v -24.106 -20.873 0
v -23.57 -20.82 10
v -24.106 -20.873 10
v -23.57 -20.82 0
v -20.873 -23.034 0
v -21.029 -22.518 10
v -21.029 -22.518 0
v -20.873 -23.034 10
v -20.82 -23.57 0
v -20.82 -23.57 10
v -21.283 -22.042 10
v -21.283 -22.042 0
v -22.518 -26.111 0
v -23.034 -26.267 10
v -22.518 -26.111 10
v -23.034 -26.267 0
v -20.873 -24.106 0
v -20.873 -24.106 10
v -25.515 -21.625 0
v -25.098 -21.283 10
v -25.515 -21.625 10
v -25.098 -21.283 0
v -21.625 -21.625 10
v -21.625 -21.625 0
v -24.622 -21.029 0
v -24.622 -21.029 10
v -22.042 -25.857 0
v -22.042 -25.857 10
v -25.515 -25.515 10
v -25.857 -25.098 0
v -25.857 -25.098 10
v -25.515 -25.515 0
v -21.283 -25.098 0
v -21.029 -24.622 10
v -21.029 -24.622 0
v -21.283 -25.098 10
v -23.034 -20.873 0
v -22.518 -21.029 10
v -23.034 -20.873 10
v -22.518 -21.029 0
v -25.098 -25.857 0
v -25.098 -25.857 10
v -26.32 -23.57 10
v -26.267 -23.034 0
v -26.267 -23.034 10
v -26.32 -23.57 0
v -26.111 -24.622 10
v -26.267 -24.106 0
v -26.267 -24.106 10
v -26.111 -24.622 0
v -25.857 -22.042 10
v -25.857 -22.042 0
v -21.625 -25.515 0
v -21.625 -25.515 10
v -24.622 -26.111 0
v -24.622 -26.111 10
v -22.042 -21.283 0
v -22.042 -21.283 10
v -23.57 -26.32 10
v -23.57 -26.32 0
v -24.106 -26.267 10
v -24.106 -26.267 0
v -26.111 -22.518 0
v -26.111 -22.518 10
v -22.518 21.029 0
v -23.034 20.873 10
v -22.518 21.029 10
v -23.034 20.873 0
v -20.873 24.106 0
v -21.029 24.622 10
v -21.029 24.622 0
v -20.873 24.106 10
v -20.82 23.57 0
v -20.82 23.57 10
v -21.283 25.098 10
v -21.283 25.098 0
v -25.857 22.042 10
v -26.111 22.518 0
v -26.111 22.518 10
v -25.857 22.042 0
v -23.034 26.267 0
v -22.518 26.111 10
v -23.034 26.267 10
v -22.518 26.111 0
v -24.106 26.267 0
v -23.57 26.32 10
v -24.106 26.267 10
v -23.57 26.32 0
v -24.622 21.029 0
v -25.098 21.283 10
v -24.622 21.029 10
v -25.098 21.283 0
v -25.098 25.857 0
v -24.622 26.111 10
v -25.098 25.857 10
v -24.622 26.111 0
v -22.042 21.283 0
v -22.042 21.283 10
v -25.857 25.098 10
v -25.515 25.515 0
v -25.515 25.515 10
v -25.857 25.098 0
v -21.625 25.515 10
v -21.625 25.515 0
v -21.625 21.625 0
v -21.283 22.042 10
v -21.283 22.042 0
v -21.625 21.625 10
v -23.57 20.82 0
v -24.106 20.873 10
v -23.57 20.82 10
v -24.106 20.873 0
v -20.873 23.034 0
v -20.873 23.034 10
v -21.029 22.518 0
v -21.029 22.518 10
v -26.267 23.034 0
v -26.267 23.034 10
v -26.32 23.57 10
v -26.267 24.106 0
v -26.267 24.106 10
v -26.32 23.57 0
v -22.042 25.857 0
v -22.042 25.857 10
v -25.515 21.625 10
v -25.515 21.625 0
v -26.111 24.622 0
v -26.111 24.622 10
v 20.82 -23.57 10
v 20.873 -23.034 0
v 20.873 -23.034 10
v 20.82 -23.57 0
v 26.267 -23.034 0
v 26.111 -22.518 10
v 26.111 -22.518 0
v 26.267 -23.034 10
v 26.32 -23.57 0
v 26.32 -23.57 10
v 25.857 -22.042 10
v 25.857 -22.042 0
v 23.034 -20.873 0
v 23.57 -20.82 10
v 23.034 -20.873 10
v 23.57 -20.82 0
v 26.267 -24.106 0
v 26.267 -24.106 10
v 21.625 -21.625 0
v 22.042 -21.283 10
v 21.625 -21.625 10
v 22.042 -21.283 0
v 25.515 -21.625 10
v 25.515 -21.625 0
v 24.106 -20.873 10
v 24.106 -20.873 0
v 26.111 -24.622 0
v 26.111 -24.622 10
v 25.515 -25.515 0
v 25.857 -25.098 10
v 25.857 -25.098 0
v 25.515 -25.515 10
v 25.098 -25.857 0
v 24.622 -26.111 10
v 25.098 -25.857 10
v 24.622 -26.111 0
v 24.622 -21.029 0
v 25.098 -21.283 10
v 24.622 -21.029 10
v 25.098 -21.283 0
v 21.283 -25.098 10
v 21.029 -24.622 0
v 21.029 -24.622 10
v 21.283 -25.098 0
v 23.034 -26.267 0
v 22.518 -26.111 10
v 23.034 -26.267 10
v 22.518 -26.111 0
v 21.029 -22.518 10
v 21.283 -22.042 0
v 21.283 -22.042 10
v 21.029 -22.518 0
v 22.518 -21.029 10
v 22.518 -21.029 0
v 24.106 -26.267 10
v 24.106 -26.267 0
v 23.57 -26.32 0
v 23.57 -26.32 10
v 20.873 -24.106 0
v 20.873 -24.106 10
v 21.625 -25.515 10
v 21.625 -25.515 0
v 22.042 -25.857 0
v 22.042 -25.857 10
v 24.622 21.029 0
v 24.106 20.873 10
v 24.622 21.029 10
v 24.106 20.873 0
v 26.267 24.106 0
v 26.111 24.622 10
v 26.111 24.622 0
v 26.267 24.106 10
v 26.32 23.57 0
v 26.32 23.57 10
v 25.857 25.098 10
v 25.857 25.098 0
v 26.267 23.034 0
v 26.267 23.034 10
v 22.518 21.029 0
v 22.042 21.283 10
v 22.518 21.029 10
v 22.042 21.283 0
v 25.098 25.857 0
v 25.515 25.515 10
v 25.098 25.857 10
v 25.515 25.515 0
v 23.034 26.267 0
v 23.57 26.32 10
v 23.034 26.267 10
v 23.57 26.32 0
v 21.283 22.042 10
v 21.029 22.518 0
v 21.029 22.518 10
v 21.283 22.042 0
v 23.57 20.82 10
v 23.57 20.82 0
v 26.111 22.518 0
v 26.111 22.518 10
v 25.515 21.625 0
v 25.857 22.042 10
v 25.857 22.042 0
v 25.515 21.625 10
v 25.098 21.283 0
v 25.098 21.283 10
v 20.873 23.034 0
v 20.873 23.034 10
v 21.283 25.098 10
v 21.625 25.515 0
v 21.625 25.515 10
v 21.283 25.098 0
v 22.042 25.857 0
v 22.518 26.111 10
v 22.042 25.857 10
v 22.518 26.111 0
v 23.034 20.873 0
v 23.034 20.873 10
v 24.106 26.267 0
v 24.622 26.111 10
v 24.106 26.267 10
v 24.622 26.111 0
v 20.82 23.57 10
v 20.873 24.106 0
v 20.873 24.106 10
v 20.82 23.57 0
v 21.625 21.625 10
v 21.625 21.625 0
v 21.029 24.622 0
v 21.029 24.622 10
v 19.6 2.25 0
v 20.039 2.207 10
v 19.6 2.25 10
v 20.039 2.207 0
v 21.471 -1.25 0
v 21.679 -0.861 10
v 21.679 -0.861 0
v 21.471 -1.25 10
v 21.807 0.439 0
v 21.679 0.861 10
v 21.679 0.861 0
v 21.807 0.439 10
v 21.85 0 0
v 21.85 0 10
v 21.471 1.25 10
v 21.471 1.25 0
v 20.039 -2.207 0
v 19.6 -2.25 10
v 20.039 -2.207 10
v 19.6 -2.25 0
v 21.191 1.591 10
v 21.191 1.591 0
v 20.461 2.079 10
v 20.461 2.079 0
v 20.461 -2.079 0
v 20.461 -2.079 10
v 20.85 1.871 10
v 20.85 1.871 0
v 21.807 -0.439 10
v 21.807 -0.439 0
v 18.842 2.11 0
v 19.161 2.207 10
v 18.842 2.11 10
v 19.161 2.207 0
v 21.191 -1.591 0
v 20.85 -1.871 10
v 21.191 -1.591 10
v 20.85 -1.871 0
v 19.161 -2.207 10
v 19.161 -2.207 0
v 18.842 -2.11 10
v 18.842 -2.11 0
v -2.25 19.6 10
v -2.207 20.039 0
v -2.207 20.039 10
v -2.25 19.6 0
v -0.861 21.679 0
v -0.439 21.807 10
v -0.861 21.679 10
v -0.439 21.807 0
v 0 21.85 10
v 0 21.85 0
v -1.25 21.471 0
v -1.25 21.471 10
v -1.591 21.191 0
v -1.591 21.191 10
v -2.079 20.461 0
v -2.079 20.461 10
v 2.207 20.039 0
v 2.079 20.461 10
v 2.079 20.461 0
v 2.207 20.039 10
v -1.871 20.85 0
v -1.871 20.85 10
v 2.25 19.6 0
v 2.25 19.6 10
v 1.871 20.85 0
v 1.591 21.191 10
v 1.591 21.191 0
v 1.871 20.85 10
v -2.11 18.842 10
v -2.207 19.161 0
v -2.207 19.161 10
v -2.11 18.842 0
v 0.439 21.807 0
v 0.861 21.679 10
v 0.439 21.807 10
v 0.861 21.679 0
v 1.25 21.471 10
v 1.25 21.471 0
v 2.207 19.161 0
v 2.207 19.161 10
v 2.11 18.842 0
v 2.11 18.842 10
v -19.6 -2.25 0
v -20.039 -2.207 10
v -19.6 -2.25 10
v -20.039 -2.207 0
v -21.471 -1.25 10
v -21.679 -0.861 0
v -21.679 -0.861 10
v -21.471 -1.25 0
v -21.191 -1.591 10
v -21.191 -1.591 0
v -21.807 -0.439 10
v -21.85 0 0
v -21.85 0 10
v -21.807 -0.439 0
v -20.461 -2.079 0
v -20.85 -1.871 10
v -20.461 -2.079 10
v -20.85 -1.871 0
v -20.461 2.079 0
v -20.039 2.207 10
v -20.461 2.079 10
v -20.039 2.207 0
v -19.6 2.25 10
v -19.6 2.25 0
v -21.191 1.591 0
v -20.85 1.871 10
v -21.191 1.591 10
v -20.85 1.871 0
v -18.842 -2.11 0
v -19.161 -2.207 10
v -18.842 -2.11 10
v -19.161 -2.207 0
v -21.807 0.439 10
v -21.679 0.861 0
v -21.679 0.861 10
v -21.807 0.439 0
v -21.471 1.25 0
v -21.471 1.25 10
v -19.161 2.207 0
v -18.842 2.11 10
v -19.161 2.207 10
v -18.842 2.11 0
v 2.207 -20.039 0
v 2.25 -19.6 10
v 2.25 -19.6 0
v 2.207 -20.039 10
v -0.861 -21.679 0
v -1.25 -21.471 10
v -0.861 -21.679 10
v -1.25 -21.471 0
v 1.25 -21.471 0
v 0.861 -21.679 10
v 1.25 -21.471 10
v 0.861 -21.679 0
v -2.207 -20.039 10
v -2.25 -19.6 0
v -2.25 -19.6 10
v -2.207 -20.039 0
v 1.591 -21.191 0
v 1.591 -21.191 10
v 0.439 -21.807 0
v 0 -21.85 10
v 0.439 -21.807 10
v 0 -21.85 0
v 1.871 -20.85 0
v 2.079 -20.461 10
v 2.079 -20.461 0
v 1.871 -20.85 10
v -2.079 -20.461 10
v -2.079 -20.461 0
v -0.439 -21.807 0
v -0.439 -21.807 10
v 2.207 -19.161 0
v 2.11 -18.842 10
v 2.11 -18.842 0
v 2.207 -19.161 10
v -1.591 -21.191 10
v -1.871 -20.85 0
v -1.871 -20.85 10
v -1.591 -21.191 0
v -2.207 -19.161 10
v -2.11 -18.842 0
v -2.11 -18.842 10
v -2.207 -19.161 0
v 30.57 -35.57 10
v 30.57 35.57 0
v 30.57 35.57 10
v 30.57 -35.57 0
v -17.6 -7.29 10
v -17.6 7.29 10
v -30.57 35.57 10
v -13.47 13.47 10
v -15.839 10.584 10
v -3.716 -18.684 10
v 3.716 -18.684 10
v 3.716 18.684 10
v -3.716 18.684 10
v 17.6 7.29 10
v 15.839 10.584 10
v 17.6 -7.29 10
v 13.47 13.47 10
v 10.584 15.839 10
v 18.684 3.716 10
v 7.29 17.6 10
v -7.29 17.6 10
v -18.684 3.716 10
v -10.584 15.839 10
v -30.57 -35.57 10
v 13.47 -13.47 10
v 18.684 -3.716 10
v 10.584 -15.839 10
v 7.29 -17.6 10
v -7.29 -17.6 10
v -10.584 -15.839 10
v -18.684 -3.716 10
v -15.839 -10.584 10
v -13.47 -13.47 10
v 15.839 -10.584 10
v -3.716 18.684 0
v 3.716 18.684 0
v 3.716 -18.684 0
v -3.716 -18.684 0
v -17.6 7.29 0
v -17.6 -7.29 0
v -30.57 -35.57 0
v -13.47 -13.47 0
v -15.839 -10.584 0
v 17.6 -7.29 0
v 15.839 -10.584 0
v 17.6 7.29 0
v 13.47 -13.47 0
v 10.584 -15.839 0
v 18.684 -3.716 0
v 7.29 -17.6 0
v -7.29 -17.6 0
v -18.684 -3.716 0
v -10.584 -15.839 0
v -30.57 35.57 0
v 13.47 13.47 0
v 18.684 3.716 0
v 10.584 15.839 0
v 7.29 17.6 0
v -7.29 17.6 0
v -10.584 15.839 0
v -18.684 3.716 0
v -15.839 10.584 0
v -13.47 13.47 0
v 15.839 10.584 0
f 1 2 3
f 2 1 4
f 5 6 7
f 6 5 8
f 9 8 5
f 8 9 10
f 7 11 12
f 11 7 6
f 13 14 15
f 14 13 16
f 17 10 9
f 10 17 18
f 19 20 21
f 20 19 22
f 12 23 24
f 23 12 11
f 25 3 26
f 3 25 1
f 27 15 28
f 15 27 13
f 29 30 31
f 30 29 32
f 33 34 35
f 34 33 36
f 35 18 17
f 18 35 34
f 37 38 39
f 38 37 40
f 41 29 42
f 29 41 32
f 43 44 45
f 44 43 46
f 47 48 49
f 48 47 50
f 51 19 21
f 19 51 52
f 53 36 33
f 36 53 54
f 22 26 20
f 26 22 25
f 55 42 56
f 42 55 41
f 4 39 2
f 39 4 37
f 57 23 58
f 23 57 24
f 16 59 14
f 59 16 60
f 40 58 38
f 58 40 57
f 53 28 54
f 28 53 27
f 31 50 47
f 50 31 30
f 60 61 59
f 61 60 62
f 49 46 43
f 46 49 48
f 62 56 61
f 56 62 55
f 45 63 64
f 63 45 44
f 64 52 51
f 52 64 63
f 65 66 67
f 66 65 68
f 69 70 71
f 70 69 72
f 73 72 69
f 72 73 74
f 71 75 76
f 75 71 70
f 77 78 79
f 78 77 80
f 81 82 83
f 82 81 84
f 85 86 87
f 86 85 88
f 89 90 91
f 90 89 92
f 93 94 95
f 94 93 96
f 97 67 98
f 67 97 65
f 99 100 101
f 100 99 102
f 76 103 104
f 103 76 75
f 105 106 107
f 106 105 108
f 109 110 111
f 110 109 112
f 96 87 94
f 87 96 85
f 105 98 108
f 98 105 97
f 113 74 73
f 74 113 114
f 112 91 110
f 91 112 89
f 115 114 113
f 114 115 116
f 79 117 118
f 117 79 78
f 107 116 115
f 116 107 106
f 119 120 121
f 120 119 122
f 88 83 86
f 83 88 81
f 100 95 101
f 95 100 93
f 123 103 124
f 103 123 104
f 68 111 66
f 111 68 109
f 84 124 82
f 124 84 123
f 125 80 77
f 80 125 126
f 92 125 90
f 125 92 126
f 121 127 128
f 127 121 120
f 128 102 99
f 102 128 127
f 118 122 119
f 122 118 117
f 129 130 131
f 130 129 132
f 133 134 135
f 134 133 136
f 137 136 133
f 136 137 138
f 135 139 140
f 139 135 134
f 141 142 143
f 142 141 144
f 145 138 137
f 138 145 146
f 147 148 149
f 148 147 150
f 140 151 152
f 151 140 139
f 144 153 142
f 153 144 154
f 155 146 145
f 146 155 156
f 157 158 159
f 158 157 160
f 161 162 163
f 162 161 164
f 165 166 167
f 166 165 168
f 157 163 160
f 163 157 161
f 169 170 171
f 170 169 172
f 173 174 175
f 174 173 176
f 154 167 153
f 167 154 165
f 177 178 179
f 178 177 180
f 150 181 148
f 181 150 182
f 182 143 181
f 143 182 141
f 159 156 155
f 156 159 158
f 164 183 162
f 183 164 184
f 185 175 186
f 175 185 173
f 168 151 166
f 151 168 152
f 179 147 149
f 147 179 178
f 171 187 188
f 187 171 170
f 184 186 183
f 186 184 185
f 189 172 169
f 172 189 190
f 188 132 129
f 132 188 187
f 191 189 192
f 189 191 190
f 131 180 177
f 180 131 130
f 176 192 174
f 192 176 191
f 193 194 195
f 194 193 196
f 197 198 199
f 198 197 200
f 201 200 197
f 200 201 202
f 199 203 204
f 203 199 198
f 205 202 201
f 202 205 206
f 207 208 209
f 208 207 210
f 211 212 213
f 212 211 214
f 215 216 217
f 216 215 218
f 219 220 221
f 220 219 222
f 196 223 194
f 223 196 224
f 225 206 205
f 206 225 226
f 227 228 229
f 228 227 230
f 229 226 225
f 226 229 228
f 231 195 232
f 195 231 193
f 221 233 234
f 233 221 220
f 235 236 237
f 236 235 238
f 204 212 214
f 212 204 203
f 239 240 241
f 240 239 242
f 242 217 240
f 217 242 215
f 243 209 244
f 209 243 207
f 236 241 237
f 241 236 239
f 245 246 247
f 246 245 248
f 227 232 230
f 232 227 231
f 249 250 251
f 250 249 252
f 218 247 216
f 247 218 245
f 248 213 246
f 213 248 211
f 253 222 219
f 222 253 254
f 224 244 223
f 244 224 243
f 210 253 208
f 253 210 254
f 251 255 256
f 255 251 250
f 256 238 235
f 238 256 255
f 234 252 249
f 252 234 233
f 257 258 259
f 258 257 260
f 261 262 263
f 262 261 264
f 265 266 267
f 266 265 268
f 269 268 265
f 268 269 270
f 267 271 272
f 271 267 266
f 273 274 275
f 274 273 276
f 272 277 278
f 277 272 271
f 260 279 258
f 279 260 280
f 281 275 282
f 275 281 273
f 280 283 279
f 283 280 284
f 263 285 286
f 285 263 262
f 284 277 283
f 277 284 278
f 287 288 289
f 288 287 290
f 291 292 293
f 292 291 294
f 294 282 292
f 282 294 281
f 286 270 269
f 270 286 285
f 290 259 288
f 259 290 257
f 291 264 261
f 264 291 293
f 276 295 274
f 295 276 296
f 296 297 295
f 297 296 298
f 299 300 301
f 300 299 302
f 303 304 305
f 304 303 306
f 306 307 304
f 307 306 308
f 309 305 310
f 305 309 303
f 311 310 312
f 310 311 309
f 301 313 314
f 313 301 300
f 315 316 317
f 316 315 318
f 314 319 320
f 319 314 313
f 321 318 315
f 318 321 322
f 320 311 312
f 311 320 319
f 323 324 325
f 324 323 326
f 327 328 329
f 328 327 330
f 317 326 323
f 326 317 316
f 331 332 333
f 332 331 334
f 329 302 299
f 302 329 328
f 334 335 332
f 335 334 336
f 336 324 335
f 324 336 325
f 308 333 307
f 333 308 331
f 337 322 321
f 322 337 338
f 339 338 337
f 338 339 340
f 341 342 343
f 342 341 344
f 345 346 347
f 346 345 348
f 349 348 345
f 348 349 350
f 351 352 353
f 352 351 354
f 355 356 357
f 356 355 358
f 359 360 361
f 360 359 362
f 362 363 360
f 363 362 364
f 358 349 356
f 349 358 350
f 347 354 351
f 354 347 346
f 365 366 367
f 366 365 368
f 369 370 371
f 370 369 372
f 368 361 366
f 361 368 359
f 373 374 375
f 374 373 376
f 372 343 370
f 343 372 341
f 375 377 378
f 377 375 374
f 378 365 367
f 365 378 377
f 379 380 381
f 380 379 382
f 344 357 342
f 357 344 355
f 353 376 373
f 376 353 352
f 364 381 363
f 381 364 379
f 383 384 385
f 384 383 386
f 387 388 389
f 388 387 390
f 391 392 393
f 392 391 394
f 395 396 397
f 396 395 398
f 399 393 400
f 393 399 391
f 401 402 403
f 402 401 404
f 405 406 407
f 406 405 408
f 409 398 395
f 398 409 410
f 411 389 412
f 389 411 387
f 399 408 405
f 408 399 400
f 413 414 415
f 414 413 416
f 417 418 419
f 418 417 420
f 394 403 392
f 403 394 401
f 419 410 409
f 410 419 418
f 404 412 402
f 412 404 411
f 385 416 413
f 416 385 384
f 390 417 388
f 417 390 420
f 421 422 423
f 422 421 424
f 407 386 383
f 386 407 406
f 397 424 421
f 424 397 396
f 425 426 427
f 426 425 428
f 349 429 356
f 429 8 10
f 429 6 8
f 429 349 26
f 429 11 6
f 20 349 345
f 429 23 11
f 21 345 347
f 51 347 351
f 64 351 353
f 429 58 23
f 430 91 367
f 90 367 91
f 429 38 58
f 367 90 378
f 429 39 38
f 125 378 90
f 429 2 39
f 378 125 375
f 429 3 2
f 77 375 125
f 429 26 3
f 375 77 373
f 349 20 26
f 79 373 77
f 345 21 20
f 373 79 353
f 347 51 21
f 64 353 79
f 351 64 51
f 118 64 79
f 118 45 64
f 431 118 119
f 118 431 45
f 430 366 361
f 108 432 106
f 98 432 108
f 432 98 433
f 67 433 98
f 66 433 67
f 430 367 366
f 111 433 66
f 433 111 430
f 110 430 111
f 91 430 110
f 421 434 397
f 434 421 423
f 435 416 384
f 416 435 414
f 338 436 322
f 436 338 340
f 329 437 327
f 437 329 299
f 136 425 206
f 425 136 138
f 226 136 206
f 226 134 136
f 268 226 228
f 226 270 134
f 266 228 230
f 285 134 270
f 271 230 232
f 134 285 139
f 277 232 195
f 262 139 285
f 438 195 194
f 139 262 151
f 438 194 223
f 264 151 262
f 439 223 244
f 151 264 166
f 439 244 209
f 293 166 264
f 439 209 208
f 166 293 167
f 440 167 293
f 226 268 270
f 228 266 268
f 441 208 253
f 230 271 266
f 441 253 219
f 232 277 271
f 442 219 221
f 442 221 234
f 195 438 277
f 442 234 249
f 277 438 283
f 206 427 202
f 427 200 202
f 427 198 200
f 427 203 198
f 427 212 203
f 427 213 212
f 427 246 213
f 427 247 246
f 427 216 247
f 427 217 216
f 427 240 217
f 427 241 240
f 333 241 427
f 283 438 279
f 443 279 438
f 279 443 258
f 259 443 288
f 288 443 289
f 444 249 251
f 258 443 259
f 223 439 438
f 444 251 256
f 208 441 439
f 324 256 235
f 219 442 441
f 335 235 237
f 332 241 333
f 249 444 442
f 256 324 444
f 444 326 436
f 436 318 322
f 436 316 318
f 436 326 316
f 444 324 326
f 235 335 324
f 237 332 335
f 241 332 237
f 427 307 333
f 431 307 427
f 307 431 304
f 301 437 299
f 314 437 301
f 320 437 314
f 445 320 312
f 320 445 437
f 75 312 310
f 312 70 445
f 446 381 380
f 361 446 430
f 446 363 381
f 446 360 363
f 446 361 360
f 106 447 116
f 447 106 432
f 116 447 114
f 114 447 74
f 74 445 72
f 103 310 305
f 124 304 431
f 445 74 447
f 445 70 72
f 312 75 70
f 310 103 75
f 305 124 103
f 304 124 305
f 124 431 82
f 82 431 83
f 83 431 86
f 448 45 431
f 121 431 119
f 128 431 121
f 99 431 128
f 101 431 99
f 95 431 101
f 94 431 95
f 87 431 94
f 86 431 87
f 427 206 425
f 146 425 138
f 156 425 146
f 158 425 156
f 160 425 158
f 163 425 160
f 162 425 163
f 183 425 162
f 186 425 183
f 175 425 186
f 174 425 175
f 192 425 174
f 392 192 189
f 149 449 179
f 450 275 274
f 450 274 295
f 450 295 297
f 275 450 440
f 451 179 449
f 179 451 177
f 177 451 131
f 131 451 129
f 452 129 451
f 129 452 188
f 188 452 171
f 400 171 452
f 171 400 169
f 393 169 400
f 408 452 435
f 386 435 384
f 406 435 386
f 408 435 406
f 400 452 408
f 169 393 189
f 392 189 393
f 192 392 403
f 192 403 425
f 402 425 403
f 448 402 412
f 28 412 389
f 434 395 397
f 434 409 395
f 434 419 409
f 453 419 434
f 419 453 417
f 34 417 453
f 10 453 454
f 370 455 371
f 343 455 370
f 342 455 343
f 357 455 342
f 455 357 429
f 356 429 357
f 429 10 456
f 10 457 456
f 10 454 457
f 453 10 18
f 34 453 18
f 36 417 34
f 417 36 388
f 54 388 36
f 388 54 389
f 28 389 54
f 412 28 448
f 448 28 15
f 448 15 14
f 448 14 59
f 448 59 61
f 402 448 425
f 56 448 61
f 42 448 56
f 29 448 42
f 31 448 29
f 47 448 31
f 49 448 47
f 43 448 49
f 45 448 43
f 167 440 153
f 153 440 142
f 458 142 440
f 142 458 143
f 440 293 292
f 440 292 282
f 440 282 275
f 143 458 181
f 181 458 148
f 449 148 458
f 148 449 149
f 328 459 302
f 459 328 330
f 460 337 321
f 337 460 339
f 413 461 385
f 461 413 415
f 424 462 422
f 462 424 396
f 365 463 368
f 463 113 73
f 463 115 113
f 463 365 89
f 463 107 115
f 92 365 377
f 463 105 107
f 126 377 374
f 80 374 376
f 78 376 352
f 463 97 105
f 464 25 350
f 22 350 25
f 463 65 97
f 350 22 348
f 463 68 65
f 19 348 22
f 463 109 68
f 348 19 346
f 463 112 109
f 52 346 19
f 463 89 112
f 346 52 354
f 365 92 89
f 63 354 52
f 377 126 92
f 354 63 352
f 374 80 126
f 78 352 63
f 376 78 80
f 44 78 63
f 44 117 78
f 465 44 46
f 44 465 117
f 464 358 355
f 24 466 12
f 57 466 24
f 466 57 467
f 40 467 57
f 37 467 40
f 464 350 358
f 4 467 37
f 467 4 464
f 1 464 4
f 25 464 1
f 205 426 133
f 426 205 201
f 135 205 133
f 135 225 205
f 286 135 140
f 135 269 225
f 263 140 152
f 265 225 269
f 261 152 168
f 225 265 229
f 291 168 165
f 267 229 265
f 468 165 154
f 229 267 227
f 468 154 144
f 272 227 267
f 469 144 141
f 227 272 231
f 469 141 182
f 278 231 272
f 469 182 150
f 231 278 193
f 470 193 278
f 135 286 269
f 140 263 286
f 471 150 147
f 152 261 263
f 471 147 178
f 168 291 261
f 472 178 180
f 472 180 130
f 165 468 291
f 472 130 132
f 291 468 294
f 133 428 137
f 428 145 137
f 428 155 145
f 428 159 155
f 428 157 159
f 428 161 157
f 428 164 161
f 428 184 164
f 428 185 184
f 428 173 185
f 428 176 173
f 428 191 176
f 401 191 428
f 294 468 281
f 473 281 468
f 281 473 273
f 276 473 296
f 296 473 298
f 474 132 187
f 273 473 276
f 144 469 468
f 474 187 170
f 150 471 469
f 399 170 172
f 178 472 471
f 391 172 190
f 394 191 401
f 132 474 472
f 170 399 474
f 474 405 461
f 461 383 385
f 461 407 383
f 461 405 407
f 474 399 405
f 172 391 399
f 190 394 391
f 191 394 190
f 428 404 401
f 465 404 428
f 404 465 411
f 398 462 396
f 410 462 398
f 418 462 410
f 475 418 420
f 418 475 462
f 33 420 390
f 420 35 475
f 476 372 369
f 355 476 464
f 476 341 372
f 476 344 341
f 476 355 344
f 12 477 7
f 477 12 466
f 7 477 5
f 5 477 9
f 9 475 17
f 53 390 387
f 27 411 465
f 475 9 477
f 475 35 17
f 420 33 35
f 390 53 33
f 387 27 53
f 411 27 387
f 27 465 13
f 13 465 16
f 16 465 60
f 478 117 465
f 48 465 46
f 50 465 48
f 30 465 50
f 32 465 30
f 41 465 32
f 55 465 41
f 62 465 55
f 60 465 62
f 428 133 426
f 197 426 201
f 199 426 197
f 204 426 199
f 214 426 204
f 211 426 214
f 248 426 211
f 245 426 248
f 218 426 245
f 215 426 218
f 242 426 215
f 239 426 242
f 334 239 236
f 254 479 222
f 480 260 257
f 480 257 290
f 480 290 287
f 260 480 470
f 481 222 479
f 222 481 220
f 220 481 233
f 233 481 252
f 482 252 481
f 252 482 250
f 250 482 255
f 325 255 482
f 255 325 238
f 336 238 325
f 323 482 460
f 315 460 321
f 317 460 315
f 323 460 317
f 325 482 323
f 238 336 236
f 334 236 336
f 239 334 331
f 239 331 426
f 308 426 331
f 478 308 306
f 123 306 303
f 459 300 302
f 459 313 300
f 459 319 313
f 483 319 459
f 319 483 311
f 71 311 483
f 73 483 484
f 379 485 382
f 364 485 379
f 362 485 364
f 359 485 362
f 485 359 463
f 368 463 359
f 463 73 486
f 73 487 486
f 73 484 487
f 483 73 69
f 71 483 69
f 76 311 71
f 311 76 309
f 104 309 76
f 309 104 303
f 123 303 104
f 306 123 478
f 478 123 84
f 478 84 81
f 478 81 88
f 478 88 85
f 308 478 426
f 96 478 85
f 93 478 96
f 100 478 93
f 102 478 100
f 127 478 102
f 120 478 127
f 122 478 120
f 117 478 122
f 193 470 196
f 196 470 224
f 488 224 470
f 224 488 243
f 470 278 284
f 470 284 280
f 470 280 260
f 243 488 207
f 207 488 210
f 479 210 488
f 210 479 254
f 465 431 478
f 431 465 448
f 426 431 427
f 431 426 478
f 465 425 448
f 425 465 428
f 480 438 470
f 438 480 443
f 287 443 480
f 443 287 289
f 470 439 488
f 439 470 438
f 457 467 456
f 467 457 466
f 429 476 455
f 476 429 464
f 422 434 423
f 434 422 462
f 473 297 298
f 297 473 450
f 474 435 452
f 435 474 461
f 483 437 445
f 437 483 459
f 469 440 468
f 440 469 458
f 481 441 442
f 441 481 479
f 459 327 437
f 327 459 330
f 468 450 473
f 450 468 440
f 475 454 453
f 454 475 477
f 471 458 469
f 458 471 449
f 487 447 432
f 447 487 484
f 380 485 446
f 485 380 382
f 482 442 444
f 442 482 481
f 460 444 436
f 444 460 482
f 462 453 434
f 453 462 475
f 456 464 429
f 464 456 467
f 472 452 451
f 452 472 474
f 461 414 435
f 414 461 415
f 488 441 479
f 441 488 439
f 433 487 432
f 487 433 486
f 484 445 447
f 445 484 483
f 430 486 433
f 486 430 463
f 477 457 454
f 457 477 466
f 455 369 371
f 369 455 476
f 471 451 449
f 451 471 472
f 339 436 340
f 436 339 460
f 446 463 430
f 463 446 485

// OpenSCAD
$fn = 32;

// ----------------------------------------------------------------------
// Motor mount plate: NEMA23, 61.14 x 71.14 x 10 mm
// ----------------------------------------------------------------------

// --- parameters (mm) ---
base_x = 61.14;           // plate length, X
base_y = 71.14;           // plate width, Y
thick = 10;               // plate thickness
bolt_pitch = 47.14;       // NEMA23 bolt spacing
motor_d = 5.5;            // NEMA23 screw clearance
boss_hole = 38.1;         // pilot boss bore
second_d = 4.5;           // second fastener hole
bc_r = 19.6;              // second bolt circle radius
bc_n = 4;                 // second bolt circle count

module plate() {
  translate([-base_x / 2, -base_y / 2, 0]) cube([base_x, base_y, thick]);
}

module motor_holes() {
  for (sx = [-1, 1]) for (sy = [-1, 1])
    translate([sx * bolt_pitch / 2, sy * bolt_pitch / 2, -1])
      cylinder(h = thick + 2, d = motor_d);
}

difference() {
  union() {
    plate();
  }
  motor_holes();
  translate([0, 0, -1]) cylinder(h = thick + 2, d = boss_hole);
  for (i = [0 : bc_n - 1]) rotate([0, 0, i * 360 / bc_n]) translate([bc_r, 0, -1])    cylinder(h = thick + 2, d = second_d);
}
